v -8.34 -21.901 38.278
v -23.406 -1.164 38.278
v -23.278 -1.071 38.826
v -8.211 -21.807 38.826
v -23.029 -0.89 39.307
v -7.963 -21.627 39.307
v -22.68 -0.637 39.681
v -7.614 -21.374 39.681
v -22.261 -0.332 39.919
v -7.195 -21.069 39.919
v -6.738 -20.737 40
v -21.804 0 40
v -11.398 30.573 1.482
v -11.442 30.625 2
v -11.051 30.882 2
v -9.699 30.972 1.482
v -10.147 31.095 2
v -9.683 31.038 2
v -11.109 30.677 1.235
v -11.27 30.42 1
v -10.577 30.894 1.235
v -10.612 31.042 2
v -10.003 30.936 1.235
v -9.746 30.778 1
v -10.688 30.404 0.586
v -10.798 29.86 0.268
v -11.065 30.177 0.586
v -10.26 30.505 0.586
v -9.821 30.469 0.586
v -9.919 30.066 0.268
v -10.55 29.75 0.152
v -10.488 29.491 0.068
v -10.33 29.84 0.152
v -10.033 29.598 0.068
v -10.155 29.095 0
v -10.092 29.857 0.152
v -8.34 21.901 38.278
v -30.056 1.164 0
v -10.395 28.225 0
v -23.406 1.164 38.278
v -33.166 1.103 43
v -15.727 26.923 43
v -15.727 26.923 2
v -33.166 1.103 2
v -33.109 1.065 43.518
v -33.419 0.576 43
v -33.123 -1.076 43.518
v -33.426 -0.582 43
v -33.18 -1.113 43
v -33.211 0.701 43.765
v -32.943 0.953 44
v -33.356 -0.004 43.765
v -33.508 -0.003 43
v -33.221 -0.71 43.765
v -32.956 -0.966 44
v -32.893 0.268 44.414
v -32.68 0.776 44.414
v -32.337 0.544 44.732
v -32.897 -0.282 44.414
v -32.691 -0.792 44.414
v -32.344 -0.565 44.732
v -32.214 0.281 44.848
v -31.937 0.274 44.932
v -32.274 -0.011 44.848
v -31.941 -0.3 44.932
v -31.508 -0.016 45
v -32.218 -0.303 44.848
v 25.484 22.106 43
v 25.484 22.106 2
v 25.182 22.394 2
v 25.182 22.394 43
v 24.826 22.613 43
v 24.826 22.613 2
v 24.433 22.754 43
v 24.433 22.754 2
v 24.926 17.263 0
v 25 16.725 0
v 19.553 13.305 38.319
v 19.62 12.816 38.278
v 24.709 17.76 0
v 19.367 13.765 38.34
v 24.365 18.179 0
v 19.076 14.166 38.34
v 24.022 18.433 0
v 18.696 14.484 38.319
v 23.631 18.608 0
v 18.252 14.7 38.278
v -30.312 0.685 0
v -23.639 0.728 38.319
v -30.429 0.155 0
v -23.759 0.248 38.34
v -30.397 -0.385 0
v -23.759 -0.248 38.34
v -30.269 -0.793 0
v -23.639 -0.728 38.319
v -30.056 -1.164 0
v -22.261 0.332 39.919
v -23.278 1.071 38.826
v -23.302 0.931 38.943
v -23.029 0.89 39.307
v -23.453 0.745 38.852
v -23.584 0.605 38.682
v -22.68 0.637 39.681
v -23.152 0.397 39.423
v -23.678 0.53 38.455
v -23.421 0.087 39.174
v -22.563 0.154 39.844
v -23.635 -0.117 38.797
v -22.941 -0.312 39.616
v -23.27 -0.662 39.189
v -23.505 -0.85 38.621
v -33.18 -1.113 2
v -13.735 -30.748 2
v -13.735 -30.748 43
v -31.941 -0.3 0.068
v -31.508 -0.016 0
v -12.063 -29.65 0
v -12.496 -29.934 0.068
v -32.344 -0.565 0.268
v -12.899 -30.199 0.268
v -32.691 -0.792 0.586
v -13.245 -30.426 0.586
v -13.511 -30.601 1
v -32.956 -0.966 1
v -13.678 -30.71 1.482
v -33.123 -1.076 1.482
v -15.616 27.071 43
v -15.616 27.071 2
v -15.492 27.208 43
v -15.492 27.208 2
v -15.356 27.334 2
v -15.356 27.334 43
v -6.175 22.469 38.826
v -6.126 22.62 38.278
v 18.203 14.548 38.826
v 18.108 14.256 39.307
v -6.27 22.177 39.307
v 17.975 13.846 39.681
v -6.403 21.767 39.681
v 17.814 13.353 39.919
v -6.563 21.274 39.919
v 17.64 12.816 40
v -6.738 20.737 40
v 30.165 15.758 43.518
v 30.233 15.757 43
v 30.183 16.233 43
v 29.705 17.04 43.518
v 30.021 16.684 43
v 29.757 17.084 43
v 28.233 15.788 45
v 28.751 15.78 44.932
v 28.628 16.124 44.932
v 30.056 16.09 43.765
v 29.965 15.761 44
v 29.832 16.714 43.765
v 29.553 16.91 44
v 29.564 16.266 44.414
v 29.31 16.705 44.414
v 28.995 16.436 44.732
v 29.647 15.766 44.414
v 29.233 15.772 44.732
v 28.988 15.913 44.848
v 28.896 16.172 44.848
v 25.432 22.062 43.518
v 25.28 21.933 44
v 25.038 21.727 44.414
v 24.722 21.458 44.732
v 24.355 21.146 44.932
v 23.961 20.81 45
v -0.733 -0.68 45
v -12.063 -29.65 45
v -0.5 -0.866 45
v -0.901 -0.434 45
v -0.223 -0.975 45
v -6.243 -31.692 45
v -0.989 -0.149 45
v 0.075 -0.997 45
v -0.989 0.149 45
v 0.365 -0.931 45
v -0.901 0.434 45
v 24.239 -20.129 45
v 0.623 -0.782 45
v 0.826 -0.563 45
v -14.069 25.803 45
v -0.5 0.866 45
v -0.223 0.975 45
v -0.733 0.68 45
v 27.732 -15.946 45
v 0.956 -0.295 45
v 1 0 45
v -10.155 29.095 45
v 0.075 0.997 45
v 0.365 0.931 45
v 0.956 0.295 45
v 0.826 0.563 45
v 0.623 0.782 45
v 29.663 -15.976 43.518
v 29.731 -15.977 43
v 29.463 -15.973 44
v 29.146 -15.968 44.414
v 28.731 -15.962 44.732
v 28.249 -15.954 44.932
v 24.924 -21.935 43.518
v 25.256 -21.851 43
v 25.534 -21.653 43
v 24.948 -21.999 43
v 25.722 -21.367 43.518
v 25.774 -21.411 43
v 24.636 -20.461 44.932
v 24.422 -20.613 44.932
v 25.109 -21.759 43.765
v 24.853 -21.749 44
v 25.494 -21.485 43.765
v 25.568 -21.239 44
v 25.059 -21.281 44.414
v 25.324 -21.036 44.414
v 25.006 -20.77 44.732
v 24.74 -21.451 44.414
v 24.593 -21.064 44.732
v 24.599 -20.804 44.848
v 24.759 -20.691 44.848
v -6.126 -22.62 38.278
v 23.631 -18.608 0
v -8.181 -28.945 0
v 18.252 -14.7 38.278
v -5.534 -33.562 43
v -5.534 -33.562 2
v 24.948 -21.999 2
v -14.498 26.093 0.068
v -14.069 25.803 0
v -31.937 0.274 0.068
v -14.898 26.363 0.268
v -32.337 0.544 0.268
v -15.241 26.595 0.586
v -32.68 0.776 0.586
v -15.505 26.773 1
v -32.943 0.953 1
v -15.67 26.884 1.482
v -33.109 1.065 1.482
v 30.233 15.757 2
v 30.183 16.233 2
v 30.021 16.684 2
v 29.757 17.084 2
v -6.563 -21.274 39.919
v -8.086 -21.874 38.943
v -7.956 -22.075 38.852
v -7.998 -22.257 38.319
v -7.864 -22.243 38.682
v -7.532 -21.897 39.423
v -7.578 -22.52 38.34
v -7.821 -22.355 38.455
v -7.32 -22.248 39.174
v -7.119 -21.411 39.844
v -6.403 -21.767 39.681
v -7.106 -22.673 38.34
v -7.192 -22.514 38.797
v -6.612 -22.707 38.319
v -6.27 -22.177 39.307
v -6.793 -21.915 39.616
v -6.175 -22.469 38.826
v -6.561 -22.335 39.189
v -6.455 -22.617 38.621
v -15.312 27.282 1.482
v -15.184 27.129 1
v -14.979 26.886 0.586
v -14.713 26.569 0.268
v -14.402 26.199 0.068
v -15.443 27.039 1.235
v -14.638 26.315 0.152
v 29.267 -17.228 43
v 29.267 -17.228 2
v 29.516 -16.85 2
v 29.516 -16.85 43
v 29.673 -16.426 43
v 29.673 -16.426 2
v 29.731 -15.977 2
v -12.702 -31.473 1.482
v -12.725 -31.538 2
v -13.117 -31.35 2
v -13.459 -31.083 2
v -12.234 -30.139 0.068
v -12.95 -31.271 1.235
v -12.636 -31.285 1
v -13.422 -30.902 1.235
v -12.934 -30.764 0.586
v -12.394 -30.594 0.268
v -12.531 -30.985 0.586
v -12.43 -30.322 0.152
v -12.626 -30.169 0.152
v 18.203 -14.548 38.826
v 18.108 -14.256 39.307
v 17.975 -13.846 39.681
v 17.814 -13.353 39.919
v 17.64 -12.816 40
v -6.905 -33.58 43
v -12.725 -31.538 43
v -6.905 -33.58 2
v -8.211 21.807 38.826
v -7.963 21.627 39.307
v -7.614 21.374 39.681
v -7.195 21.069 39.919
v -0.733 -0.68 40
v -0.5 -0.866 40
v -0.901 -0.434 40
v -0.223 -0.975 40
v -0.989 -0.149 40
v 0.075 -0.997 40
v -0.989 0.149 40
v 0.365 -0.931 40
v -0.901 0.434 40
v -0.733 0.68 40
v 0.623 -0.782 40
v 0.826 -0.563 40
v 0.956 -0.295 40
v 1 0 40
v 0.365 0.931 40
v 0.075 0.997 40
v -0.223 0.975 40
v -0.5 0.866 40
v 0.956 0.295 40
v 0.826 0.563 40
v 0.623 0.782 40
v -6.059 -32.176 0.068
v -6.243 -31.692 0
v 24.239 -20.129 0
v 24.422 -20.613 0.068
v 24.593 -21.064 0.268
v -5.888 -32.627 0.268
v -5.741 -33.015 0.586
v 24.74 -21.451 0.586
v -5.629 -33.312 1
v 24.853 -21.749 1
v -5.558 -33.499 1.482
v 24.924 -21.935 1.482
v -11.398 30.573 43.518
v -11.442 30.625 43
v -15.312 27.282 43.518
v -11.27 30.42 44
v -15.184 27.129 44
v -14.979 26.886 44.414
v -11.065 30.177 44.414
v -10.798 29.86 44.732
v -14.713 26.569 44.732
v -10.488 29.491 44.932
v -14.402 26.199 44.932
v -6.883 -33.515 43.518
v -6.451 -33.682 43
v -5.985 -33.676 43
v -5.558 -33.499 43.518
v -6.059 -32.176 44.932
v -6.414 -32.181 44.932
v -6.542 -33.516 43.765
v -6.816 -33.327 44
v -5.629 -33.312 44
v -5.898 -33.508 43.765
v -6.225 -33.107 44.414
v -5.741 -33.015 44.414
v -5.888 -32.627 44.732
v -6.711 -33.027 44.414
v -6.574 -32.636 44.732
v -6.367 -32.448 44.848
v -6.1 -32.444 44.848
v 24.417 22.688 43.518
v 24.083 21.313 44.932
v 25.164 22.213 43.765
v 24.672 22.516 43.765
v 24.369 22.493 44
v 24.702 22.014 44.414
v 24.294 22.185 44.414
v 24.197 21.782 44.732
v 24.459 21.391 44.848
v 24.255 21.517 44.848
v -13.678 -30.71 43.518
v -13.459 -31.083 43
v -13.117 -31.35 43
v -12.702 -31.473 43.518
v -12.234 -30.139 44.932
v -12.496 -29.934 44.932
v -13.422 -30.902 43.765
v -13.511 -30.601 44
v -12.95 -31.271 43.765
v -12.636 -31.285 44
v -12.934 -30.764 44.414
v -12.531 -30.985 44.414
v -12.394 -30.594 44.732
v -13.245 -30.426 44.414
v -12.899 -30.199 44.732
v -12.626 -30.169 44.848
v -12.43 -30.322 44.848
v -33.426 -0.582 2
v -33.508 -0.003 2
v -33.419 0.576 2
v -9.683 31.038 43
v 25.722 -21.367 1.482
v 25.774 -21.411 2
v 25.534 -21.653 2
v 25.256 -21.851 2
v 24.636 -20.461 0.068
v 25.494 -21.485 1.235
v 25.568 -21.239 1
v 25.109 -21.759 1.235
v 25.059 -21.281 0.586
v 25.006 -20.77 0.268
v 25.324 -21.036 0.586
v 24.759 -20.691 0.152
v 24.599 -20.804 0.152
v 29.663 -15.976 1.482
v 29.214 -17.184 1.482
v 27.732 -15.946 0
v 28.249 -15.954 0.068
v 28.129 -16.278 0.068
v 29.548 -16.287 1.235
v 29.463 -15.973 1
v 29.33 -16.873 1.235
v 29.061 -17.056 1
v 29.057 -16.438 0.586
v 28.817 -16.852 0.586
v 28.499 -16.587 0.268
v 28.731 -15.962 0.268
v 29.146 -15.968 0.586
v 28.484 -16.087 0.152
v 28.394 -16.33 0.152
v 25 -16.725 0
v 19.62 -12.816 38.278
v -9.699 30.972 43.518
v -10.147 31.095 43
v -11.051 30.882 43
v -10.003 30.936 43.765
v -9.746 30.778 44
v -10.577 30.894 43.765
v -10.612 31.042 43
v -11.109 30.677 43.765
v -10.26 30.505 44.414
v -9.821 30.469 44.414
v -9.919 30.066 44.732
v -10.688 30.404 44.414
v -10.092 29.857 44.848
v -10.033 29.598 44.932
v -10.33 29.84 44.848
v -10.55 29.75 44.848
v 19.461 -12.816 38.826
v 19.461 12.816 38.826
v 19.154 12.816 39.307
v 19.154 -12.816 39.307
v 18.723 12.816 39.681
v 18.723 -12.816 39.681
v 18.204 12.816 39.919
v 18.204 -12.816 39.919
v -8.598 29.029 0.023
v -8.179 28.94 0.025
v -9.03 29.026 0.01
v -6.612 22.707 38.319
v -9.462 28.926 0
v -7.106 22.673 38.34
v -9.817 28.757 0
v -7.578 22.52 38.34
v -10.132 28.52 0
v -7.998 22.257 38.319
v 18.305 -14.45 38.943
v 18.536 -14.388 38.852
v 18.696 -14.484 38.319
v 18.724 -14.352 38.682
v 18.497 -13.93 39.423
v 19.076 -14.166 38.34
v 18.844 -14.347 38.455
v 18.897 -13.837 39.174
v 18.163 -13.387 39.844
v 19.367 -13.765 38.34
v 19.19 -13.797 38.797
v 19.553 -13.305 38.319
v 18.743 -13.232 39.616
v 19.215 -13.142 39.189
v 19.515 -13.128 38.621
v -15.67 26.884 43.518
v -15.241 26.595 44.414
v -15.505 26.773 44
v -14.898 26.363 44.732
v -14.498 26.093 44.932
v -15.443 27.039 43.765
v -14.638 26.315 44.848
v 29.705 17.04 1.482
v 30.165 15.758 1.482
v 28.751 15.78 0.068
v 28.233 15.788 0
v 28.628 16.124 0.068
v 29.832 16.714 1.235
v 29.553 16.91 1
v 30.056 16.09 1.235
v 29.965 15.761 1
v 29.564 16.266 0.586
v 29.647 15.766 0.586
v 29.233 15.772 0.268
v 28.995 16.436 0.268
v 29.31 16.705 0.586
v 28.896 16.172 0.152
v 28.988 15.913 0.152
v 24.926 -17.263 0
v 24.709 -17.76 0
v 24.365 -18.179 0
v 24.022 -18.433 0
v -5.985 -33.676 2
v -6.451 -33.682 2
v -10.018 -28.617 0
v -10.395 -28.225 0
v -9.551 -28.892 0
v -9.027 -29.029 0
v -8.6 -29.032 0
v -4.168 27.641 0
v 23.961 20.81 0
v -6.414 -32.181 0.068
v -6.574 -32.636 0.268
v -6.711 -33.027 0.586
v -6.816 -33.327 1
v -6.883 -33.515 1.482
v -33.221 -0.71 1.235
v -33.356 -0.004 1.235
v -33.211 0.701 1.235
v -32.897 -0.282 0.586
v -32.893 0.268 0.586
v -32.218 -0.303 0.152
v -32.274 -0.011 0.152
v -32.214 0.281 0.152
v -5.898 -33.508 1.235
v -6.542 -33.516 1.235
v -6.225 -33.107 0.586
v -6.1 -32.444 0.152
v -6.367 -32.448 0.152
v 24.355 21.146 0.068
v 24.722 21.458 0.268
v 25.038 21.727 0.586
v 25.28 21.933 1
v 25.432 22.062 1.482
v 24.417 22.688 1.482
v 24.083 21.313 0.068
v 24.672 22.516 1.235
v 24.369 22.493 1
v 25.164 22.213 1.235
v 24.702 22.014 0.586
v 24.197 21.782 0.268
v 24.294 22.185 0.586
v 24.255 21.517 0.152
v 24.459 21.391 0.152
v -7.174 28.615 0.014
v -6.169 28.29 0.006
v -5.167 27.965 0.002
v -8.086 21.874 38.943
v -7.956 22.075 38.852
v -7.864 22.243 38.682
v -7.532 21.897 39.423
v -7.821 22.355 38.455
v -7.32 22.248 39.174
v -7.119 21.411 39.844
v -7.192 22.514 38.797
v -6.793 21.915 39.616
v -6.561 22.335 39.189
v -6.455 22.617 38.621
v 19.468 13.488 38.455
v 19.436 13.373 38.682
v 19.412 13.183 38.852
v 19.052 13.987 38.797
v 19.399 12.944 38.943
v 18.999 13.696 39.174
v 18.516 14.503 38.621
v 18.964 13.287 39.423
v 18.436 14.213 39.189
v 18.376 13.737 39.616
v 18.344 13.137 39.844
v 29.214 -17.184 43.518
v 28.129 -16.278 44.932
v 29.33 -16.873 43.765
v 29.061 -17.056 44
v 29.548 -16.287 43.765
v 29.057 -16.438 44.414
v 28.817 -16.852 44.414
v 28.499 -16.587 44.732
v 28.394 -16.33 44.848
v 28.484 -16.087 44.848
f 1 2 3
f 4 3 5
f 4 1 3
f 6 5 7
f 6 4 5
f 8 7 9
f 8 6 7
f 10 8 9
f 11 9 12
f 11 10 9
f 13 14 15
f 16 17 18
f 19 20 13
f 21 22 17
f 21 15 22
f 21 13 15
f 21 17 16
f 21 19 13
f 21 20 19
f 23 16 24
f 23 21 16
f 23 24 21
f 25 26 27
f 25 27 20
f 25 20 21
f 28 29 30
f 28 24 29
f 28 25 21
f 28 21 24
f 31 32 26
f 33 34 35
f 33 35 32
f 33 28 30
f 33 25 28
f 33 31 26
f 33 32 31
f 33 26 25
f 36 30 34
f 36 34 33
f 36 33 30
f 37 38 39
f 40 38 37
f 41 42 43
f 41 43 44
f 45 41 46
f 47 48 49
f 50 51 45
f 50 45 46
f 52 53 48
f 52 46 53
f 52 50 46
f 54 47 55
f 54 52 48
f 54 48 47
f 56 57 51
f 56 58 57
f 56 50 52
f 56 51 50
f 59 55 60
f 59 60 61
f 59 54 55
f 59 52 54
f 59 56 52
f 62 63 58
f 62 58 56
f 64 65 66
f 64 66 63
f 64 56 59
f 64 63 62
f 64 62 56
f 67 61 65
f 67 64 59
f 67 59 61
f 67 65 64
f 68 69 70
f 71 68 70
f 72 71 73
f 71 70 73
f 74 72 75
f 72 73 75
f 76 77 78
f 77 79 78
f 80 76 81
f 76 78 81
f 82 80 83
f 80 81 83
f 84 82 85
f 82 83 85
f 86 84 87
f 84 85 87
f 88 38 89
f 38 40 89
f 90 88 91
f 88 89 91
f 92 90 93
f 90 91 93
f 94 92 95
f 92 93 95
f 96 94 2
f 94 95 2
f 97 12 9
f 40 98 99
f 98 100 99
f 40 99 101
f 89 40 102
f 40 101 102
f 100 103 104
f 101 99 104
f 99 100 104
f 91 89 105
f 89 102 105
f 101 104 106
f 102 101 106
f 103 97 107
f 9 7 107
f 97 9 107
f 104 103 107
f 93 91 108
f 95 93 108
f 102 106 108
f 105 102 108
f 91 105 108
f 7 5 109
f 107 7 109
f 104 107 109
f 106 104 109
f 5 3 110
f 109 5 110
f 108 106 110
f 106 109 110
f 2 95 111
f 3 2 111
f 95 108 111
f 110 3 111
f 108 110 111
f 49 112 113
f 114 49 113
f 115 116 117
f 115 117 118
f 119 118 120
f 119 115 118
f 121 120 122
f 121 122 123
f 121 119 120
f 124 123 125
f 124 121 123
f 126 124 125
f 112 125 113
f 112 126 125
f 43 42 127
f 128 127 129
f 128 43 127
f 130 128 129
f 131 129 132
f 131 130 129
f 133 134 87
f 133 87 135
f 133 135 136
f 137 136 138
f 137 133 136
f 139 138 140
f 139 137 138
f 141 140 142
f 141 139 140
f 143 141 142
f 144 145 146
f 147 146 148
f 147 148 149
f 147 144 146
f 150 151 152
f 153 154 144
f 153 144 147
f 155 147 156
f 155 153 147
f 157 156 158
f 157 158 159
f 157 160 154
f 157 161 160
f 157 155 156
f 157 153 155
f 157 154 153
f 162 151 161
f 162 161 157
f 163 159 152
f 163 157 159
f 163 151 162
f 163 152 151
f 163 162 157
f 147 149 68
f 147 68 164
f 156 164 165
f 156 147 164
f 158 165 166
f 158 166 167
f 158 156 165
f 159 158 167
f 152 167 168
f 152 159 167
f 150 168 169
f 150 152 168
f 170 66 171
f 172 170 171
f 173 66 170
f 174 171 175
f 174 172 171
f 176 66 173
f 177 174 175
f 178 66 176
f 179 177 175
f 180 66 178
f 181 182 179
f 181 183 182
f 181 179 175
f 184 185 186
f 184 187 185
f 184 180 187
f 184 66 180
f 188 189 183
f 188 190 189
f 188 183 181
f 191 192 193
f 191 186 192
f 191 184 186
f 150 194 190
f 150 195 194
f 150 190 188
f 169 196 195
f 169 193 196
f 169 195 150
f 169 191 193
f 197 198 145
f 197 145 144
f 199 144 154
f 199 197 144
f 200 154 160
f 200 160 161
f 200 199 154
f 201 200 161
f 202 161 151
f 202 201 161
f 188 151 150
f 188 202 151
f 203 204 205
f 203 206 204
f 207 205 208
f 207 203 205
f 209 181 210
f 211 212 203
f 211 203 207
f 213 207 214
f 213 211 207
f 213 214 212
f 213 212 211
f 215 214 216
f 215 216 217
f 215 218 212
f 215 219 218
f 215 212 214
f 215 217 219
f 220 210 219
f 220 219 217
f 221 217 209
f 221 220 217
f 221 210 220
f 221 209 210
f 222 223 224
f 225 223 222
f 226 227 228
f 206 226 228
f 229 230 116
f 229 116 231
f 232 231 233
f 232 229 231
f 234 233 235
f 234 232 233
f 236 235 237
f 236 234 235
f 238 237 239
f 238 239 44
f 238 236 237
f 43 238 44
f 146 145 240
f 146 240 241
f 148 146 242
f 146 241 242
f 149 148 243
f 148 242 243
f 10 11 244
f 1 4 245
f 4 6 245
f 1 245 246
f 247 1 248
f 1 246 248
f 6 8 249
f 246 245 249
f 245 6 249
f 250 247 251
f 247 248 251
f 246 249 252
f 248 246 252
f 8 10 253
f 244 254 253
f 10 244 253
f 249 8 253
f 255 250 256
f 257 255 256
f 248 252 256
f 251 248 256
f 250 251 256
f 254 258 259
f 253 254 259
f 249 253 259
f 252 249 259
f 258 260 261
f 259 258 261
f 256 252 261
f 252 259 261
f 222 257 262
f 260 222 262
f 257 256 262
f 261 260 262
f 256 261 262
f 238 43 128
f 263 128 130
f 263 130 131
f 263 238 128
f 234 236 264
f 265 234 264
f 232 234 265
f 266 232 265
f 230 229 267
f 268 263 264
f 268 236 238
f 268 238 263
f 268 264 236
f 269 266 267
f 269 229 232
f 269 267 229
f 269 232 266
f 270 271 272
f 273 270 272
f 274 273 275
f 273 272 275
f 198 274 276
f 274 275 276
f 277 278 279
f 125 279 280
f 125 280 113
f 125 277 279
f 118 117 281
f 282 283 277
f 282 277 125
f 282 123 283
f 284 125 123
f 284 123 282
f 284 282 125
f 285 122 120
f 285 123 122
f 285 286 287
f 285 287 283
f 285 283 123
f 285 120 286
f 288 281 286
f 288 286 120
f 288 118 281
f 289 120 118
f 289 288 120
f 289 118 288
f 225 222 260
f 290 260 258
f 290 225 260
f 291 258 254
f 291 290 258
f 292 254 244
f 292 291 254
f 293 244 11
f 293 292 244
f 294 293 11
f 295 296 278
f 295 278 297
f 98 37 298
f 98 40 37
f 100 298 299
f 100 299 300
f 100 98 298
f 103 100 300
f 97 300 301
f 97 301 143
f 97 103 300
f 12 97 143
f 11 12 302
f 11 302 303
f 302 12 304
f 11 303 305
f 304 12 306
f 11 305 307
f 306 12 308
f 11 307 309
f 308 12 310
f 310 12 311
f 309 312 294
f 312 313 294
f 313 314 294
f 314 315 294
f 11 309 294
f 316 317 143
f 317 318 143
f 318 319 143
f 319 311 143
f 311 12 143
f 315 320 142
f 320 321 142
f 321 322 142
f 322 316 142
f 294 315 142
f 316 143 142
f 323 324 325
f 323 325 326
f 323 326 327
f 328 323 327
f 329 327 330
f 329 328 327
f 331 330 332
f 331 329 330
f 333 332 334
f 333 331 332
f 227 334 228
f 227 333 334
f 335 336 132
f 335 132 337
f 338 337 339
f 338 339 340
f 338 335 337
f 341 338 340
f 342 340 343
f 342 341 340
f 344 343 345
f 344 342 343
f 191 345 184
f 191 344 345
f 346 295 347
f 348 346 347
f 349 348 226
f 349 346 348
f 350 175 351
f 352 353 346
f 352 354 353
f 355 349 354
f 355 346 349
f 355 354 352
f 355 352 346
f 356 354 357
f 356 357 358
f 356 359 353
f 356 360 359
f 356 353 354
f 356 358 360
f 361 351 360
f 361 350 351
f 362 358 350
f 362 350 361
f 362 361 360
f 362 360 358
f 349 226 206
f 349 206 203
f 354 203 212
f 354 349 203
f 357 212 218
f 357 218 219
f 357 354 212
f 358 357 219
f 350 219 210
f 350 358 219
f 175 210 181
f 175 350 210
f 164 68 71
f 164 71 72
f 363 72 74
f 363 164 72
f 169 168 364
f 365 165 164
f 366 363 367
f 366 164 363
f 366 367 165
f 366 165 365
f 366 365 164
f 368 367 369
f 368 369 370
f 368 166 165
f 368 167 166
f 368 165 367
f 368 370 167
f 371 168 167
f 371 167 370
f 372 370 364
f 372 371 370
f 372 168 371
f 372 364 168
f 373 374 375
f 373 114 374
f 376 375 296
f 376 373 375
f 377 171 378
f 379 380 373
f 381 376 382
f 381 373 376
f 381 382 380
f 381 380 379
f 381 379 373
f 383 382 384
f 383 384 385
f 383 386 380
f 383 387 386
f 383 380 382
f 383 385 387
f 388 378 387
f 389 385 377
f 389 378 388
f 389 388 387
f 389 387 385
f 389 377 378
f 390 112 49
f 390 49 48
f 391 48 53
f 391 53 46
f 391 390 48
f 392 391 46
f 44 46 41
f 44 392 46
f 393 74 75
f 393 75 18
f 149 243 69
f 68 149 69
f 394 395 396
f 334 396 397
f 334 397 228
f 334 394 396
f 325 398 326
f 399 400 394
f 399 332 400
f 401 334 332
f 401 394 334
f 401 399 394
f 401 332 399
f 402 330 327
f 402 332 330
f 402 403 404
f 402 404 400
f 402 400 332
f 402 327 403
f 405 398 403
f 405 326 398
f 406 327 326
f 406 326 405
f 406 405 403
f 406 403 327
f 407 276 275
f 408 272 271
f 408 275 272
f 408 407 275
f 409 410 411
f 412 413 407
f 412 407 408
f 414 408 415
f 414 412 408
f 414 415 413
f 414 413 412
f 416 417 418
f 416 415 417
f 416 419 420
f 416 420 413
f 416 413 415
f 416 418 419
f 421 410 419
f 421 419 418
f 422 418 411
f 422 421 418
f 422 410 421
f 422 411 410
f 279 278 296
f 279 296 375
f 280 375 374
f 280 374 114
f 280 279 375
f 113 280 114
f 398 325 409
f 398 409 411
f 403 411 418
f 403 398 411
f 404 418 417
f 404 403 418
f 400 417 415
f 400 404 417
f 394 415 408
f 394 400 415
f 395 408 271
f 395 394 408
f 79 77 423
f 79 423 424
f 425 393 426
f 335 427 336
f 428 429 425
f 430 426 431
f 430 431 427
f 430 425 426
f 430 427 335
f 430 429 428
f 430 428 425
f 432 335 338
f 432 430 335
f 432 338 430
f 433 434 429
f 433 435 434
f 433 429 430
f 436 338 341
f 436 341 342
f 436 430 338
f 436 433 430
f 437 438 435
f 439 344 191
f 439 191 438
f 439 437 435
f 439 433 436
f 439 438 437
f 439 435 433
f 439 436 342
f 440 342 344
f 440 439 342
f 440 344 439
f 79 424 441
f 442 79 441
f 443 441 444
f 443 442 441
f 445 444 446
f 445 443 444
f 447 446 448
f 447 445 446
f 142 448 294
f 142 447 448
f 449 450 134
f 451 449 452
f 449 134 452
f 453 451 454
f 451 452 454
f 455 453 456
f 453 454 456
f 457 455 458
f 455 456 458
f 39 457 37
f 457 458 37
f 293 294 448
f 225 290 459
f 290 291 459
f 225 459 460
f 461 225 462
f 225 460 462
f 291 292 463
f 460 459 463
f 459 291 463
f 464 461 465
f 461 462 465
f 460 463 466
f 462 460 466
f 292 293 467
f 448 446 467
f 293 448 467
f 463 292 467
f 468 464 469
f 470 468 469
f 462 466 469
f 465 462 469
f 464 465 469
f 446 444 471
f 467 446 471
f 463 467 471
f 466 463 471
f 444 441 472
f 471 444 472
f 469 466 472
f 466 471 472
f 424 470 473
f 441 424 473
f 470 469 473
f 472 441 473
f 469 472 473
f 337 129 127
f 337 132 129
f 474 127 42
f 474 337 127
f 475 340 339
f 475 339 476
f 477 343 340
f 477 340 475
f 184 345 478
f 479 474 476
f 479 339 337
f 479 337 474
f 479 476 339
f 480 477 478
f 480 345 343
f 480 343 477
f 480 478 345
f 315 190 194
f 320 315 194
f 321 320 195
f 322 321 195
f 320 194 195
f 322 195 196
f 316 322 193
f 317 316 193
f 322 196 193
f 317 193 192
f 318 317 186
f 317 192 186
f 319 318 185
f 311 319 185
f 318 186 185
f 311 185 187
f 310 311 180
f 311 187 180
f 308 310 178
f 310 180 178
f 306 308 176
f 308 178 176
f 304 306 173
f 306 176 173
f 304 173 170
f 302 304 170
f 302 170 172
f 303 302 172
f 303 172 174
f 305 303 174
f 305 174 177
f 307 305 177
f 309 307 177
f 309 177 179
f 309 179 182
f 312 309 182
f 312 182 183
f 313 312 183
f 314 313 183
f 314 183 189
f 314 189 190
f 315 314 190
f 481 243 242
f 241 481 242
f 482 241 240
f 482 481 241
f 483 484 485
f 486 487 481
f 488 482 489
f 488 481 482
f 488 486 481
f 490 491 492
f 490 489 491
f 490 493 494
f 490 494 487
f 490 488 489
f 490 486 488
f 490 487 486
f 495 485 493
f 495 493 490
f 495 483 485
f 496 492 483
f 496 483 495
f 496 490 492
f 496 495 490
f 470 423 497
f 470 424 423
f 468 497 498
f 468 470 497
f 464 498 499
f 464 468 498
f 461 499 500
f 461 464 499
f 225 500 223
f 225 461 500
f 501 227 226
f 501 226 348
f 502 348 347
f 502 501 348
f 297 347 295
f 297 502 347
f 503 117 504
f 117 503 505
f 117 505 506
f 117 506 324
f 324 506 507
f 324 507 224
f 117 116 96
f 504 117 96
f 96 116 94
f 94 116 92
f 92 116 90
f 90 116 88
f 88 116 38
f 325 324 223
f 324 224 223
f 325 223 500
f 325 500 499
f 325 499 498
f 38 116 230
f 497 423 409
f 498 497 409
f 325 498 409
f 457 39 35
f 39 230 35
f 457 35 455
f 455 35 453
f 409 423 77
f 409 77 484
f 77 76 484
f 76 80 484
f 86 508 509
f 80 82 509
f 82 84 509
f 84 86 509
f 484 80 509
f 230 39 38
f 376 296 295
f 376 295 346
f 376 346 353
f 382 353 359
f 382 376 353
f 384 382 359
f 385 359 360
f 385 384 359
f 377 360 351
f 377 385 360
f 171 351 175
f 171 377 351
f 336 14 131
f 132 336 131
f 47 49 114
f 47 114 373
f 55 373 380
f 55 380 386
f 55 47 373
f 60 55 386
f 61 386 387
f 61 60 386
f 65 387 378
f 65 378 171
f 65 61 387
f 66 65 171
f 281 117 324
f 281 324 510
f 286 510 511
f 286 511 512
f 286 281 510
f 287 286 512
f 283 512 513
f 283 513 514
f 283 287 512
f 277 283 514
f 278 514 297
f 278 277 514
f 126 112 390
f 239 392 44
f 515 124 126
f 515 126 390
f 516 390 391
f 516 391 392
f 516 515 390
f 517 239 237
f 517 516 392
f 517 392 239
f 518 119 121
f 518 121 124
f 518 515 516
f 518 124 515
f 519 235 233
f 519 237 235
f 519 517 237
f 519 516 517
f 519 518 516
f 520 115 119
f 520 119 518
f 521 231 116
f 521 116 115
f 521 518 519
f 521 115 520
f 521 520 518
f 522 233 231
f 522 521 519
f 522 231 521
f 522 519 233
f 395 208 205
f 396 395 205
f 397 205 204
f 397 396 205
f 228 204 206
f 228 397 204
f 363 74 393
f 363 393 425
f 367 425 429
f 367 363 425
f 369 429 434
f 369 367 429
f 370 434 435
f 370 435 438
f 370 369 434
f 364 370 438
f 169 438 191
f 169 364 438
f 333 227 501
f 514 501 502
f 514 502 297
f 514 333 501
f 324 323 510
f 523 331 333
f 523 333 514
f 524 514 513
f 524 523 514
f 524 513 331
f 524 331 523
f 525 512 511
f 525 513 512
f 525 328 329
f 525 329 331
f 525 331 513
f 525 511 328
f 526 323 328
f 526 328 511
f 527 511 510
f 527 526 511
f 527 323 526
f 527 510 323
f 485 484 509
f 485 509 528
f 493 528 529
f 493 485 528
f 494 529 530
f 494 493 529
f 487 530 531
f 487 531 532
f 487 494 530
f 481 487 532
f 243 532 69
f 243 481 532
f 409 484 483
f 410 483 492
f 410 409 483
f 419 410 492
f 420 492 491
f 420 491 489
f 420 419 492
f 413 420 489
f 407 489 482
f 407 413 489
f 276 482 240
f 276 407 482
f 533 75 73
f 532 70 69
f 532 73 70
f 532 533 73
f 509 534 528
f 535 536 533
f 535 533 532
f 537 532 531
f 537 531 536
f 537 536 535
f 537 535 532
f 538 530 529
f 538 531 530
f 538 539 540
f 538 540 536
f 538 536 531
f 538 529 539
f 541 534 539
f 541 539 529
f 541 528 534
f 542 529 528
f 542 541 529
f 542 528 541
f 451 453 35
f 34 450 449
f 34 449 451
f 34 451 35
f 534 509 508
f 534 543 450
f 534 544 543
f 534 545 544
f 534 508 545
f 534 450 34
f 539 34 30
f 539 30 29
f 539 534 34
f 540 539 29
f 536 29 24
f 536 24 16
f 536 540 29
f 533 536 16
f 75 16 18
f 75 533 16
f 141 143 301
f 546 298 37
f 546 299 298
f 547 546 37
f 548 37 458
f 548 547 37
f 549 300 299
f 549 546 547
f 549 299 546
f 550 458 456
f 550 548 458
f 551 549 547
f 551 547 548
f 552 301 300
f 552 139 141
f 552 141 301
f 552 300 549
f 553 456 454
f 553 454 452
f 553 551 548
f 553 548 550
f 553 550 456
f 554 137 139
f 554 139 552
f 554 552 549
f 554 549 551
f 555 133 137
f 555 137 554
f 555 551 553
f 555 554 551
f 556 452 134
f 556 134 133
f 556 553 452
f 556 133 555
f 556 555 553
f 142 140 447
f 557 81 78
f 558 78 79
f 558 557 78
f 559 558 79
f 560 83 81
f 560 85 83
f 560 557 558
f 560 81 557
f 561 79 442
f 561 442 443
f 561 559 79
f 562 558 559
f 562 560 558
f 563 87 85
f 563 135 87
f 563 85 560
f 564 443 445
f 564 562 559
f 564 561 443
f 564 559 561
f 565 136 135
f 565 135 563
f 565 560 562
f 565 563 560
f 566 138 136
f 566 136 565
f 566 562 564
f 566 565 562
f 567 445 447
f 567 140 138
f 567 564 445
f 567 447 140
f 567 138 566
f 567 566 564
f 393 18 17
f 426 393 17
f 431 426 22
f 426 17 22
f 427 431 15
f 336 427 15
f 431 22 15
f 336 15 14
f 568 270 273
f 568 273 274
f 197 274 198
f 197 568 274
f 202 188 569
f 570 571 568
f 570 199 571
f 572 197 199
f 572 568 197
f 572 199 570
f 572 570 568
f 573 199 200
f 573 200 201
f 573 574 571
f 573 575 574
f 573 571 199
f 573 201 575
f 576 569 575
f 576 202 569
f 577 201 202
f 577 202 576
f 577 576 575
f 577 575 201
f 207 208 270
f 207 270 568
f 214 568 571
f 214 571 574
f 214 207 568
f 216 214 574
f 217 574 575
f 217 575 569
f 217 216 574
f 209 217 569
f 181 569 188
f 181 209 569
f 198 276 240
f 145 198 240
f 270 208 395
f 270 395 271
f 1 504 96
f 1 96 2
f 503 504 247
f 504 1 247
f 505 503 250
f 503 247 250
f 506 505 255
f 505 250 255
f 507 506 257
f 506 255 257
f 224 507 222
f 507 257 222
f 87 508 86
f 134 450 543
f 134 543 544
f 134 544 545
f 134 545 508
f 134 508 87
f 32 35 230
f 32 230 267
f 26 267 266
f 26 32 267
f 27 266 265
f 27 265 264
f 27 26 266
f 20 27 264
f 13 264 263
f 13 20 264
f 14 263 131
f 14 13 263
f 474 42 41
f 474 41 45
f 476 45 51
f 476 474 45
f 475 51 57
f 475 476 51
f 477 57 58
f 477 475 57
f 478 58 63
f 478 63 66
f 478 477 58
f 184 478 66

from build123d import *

# Parameters (mm, degrees)
F1_DEPTH      = 45
F3_DEPTH      = 40
F3_TAPER      = 8
F4_R          = 2
F5_T1_DEPTH   = 41
F5_T3_DEPTH   = 35.1069251356
F5_T5_DEPTH   = 6.5937371539
F5_T7_DEPTH   = 31.737863034
F5_T9_DEPTH   = 5.4498579355
F5_T11_DEPTH  = 32.6011890019
F5_T13_DEPTH  = 6.1677770557
F5_T15_DEPTH  = 35.4445627494
F5_T17_DEPTH  = 31.1568553356
F5_T19_DEPTH  = 5.1143087809
F5_T24_DEPTH  = 2
F5_T30_DEPTH  = 2
F5_T36_DEPTH  = 2
F5_T42_DEPTH  = 2
F5_T48_DEPTH  = 2
F5_T54_DEPTH  = 2
F5_T60_DEPTH  = 2
F5_T66_DEPTH  = 2
F5_T72_DEPTH  = 2
F5_T78_DEPTH  = 2
F5_T84_DEPTH  = 2
F5_T90_DEPTH  = 2
F5_T96_DEPTH  = 2
F5_T102_DEPTH = 2
F5_T108_DEPTH = 2
F5_T114_DEPTH = 2
F5_T120_DEPTH = 2
F5_T126_DEPTH = 2
F6_R          = 1
F7_DEPTH      = 45.0010001


# Not quite as in the source:
# - a fillet or chamfer that OpenCascade refuses, or shapes differently, is made with other operations: its cross-section is extruded or revolved along the edge and cut away or added


with BuildPart() as f1:
    # F0 (on Top) → F1 (new body)
    with BuildSketch(Plane.XY):
        Polygon((29.7201480716, -16.6846308857), (30.2449911833, 16.5100768209), (25.0633712858, 22.6006042212), (-10.6668910012, 31.2771238387), (-15.5701944605, 27.1541606635), (-33.9107997715, 0), (-13.3636286482, -31.3134789467), (-6.2161423266, -33.8213965297), (25.438066572, -21.8132548034), align=None)
    extrude(amount=F1_DEPTH)

    # F2 (on Top) → F3 (cut)
    with BuildSketch(Plane.XY):
        Polygon((25, -18.1635632001), (25, 18.1635632001), (-9.5491502813, 29.3892626146), (-30.9016994375, 0), (-9.5491502813, -29.3892626146), align=None)
    extrude(amount=F3_DEPTH, taper=F3_TAPER, mode=Mode.SUBTRACT)

    # F4
    f4_edges = [f1.edges().sort_by_distance(p)[0] for p in [
        (5.988245, 18.429922, 40),
        (22.189183, 16.121385, 20),
        (19.378367, 0, 40),
        (5.988245, -18.429922, 40),
        (-15.677428, -11.390318, 40),
        (-15.677428, 11.390318, 40),
        (-8.475514, 26.084949, 20.000003),
        (-27.427338, 0, 20.000003),
        (-8.475514, -26.084949, 20),
        (22.189183, -16.121385, 20.000003),
    ]]
    fillet(f4_edges, radius=F4_R)

    # F5: fillet of radius 2 on 27 edges, made by hand

    # F5_s2 → F5_t1 (cut)
    with BuildSketch(Plane.XY.offset(2)):
        with BuildLine():
            ThreePointArc((25.4839689775, 22.1062295244), (25.0095176152, 22.5131674422), (24.4326191036, 22.7537722455))
            Line((24.4326191036, 22.7537722455), (25.0633712858, 22.6006042212))
            Line((25.0633712858, 22.6006042212), (25.4839689775, 22.1062295244))
        make_face()
        with BuildLine():
            ThreePointArc((-9.6828471205, 31.0381646067), (-10.6116670526, 31.0417656744), (-11.4419497811, 30.6254124292))
            Line((-11.4419497811, 30.6254124292), (-10.6668910012, 31.2771238387))
            Line((-10.6668910012, 31.2771238387), (-9.6828471205, 31.0381646067))
        make_face()
        with BuildLine():
            ThreePointArc((30.2330765046, 15.75651015), (30.115771586, 16.4637023449), (29.7566283548, 17.0841033313))
            Line((29.7566283548, 17.0841033313), (30.2449911833, 16.5100768209))
            Line((30.2449911833, 16.5100768209), (30.2330765046, 15.75651015))
        make_face()
        with BuildLine():
            ThreePointArc((29.266810806, -17.2275902721), (29.606353406, -16.6423498995), (29.7313303454, -15.9773865656))
            Line((29.7313303454, -15.9773865656), (29.7201480716, -16.6846308857))
            Line((29.7201480716, -16.6846308857), (29.266810806, -17.2275902721))
        make_face()
        with BuildLine():
            ThreePointArc((25.7739373145, -21.4109843833), (25.3988996269, -21.7582581704), (24.9480861633, -21.9991306915))
            Line((24.9480861633, -21.9991306915), (25.438066572, -21.8132548034))
            Line((25.438066572, -21.8132548034), (25.7739373145, -21.4109843833))
        make_face()
        with BuildLine():
            ThreePointArc((-5.5335065177, -33.5624360999), (-6.217763907, -33.6923101567), (-6.90506781, -33.5796656252))
            Line((-6.90506781, -33.5796656252), (-6.2161423266, -33.8213965297))
            Line((-6.2161423266, -33.8213965297), (-5.5335065177, -33.5624360999))
        make_face()
        with BuildLine():
            ThreePointArc((-12.7249750969, -31.5375703823), (-13.294983208, -31.2257163798), (-13.7349453155, -30.7475997522))
            Line((-13.7349453155, -30.7475997522), (-13.3636286482, -31.3134789467))
            Line((-13.3636286482, -31.3134789467), (-12.7249750969, -31.5375703823))
        make_face()
        with BuildLine():
            ThreePointArc((-33.1803118935, -1.1132489554), (-33.5081152827, -0.0026852842), (-33.1655302123, 1.1034079304))
            Line((-33.1655302123, 1.1034079304), (-33.9107997715, 0))
            Line((-33.9107997715, 0), (-33.1803118935, -1.1132489554))
        make_face()
        with BuildLine():
            ThreePointArc((-15.7265735436, 26.922633804), (-15.5557596342, 27.1411687), (-15.3563537075, 27.3339695529))
            Line((-15.3563537075, 27.3339695529), (-15.5701944605, 27.1541606635))
            Line((-15.5701944605, 27.1541606635), (-15.7265735436, 26.922633804))
        make_face()
    extrude(amount=F5_T1_DEPTH, mode=Mode.SUBTRACT)

    # F5_s4 → F5_t3 (cut)
    with BuildSketch(Plane(origin=(17.8543882754, -4.335651076, 0), x_dir=(0, 0, 1), z_dir=(-0.9717588793, 0.235976017, 0))):
        with BuildLine():
            ThreePointArc((0, 25.8766923562), (0.5857864376, 27.2909059185), (2, 27.8766923562))
            Line((2, 27.8766923562), (0, 27.8766923562))
            Line((0, 27.8766923562), (0, 25.8766923562))
        make_face()
        with BuildLine():
            ThreePointArc((43, 27.8766923562), (44.4142135624, 27.2909059185), (45, 25.8766923562))
            Line((45, 25.8766923562), (45, 27.8766923562))
            Line((45, 27.8766923562), (43, 27.8766923562))
        make_face()
    extrude(amount=F5_T3_DEPTH, mode=Mode.SUBTRACT)

    # F5_s6 → F5_t5 (cut)
    with BuildSketch(Plane(origin=(4.0627522572, -4.775399283, 0), x_dir=(0, 0, 1), z_dir=(-0.6479875187, 0.7616509539, 0))):
        with BuildLine():
            ThreePointArc((0, 31.7344500987), (0.5857864376, 33.1486636611), (2, 33.7344500987))
            Line((2, 33.7344500987), (0, 33.7344500987))
            Line((0, 33.7344500987), (0, 31.7344500987))
        make_face()
        with BuildLine():
            ThreePointArc((43, 33.7344500987), (44.4142135624, 33.1486636611), (45, 31.7344500987))
            Line((45, 31.7344500987), (45, 33.7344500987))
            Line((45, 33.7344500987), (43, 33.7344500987))
        make_face()
    extrude(amount=F5_T5_DEPTH, mode=Mode.SUBTRACT)

    # F5_s8 → F5_t7 (cut)
    with BuildSketch(Plane(origin=(-0.2451254322, -15.5034273892, 0), x_dir=(0, 0, 1), z_dir=(0.0158090719, 0.9998750288, 0))):
        with BuildLine():
            ThreePointArc((0, 27.9802024391), (0.5857864376, 29.3944160014), (2, 29.9802024391))
            Line((2, 29.9802024391), (0, 29.9802024391))
            Line((0, 29.9802024391), (0, 27.9802024391))
        make_face()
        with BuildLine():
            ThreePointArc((43, 29.9802024391), (44.4142135624, 29.3944160014), (45, 27.9802024391))
            Line((45, 27.9802024391), (45, 29.9802024391))
            Line((45, 29.9802024391), (43, 29.9802024391))
        make_face()
    extrude(amount=F5_T7_DEPTH, mode=Mode.SUBTRACT)

    # F5_s10 → F5_t9 (cut)
    with BuildSketch(Plane(origin=(0.0534517688, 0.0640188702, 0), x_dir=(0, 0, 1), z_dir=(0.6409109252, 0.7676152591, 0))):
        with BuildLine():
            ThreePointArc((0, 31.5070013796), (0.5857864376, 32.9212149419), (2, 33.5070013796))
            Line((2, 33.5070013796), (0, 33.5070013796))
            Line((0, 33.5070013796), (0, 31.5070013796))
        make_face()
        with BuildLine():
            ThreePointArc((43, 33.5070013796), (44.4142135624, 32.9212149419), (45, 31.5070013796))
            Line((45, 31.5070013796), (45, 33.5070013796))
            Line((45, 33.5070013796), (43, 33.5070013796))
        make_face()
    extrude(amount=F5_T9_DEPTH, mode=Mode.SUBTRACT)

    # F5_s12 → F5_t11 (cut)
    with BuildSketch(Plane(origin=(-15.9676490674, -6.0573869861, 0), x_dir=(0, 0, 1), z_dir=(0.9349840792, 0.3546896835, 0))):
        with BuildLine():
            ThreePointArc((0, 27.4176657385), (0.5857864376, 28.8318793009), (2, 29.4176657385))
            Line((2, 29.4176657385), (0, 29.4176657385))
            Line((0, 29.4176657385), (0, 27.4176657385))
        make_face()
        with BuildLine():
            ThreePointArc((43, 29.4176657385), (44.4142135624, 28.8318793009), (45, 27.4176657385))
            Line((45, 27.4176657385), (45, 29.4176657385))
            Line((45, 29.4176657385), (43, 29.4176657385))
        make_face()
    extrude(amount=F5_T11_DEPTH, mode=Mode.SUBTRACT)

    # F5_s14 → F5_t13 (cut)
    with BuildSketch(Plane(origin=(-1.477173062, 0.5183120511, 0), x_dir=(0, 0, 1), z_dir=(0.9435988419, -0.3310909627, 0))):
        with BuildLine():
            ThreePointArc((0, 31.9719391439), (0.5857864376, 33.3861527063), (2, 33.9719391439))
            Line((2, 33.9719391439), (0, 33.9719391439))
            Line((0, 33.9719391439), (0, 31.9719391439))
        make_face()
        with BuildLine():
            ThreePointArc((43, 33.9719391439), (44.4142135624, 33.3861527063), (45, 31.9719391439))
            Line((45, 31.9719391439), (45, 33.9719391439))
            Line((45, 33.9719391439), (43, 33.9719391439))
        make_face()
    extrude(amount=F5_T13_DEPTH, mode=Mode.SUBTRACT)

    # F5_s16 → F5_t15 (cut)
    with BuildSketch(Plane(origin=(-9.4758761855, 14.4410462956, 0), x_dir=(0, 0, 1), z_dir=(0.5486135269, -0.836076072, 0))):
        with BuildLine():
            ThreePointArc((0, 26.3520082709), (0.5857864376, 27.7662218332), (2, 28.3520082709))
            Line((2, 28.3520082709), (0, 28.3520082709))
            Line((0, 28.3520082709), (0, 26.3520082709))
        make_face()
        with BuildLine():
            ThreePointArc((43, 28.3520082709), (44.4142135624, 27.7662218332), (45, 26.3520082709))
            Line((45, 26.3520082709), (45, 28.3520082709))
            Line((45, 28.3520082709), (43, 28.3520082709))
        make_face()
    extrude(amount=F5_T15_DEPTH, mode=Mode.SUBTRACT)

    # F5_s18 → F5_t17 (cut)
    with BuildSketch(Plane(origin=(7.5606241791, 11.1938728407, 0), x_dir=(0, 0, 1), z_dir=(-0.5597149161, -0.8286852314, 0))):
        with BuildLine():
            ThreePointArc((0, 26.1013789558), (0.5857864376, 27.5155925181), (2, 28.1013789558))
            Line((2, 28.1013789558), (0, 28.1013789558))
            Line((0, 28.1013789558), (0, 26.1013789558))
        make_face()
        with BuildLine():
            ThreePointArc((43, 28.1013789558), (44.4142135624, 27.5155925181), (45, 26.1013789558))
            Line((45, 26.1013789558), (45, 28.1013789558))
            Line((45, 28.1013789558), (43, 28.1013789558))
        make_face()
    extrude(amount=F5_T17_DEPTH, mode=Mode.SUBTRACT)

    # F5_s20 → F5_t19 (cut)
    with BuildSketch(Plane(origin=(8.3826927124, 7.0486221481, 0), x_dir=(0, 0, 1), z_dir=(-0.7653827905, -0.6435753134, 0))):
        with BuildLine():
            ThreePointArc((0, 28.803920042), (0.5857864376, 30.2181336044), (2, 30.803920042))
            Line((2, 30.803920042), (0, 30.803920042))
            Line((0, 30.803920042), (0, 28.803920042))
        make_face()
        with BuildLine():
            ThreePointArc((43, 30.803920042), (44.4142135624, 30.2181336044), (45, 28.803920042))
            Line((45, 28.803920042), (45, 30.803920042))
            Line((45, 30.803920042), (43, 30.803920042))
        make_face()
    extrude(amount=F5_T19_DEPTH, mode=Mode.SUBTRACT)


with BuildPart() as f5_tool22:
    # F5_s23 → F5_t24 (new body)
    with BuildSketch(Plane.XY.offset(2)):
        Polygon((23.9606670696, 20.810254487), (24.4326191036, 22.7537722455), (25.0633712858, 22.6006042212), (25.4839689775, 22.1062295244), align=None)
    extrude(amount=-F5_T24_DEPTH)

    # F5_s25 → F5_t26 (revolve, cut)
    with BuildSketch(Plane(origin=(23.9606670696, 20.810254487, 2), x_dir=(-0.5244252728, -0.8514564776, 0), z_dir=(0.8514564776, -0.5244252728, 0))):
        with BuildLine():
            ThreePointArc((0, -2), (2, 0), (0, 2))
            Line((0, 2), (0, -2))
        make_face()
    revolve(axis=Axis((23.9606670696, 20.810254487, 2), (0, 0, -1)), mode=Mode.SUBTRACT)


with BuildPart() as f1_1:
    add(f1.part)

    # F5_t21: cut F5_tool22
    add(f5_tool22.part, mode=Mode.SUBTRACT)


with BuildPart() as f5_tool28:
    # F5_s29 → F5_t30 (new body)
    with BuildSketch(Plane.XY.offset(43)):
        Polygon((23.9606670696, 20.810254487), (25.4839689775, 22.1062295244), (25.0633712858, 22.6006042212), (24.4326191036, 22.7537722455), align=None)
    extrude(amount=F5_T30_DEPTH)

    # F5_s31 → F5_t32 (revolve, cut)
    with BuildSketch(Plane(origin=(23.9606670696, 20.810254487, 43), x_dir=(-0.5244252728, -0.8514564776, 0), z_dir=(-0.8514564776, 0.5244252728, 0))):
        with BuildLine():
            ThreePointArc((0, -2), (2, 0), (0, 2))
            Line((0, 2), (0, -2))
        make_face()
    revolve(axis=Axis((23.9606670696, 20.810254487, 43), (0, 0, 1)), mode=Mode.SUBTRACT)


with BuildPart() as f1_2:
    add(f1_1.part)

    # F5_t27: cut F5_tool28
    add(f5_tool28.part, mode=Mode.SUBTRACT)


with BuildPart() as f5_tool34:
    # F5_s35 → F5_t36 (new body)
    with BuildSketch(Plane.XY.offset(2)):
        Polygon((-10.1547991544, 29.0946468482), (-9.6828471205, 31.0381646067), (-10.6668910012, 31.2771238387), (-11.4419497811, 30.6254124292), align=None)
    extrude(amount=-F5_T36_DEPTH)

    # F5_s37 → F5_t38 (revolve, cut)
    with BuildSketch(Plane(origin=(-10.1547991544, 29.0946468482, 2), x_dir=(0.2284339491, -0.9735594131, 0), z_dir=(0.9735594131, 0.2284339491, 0))):
        with BuildLine():
            ThreePointArc((0, -2), (2, 0), (0, 2))
            Line((0, 2), (0, -2))
        make_face()
    revolve(axis=Axis((-10.1547991544, 29.0946468482, 2), (0, 0, -1)), mode=Mode.SUBTRACT)


with BuildPart() as f1_3:
    add(f1_2.part)

    # F5_t33: cut F5_tool34
    add(f5_tool34.part, mode=Mode.SUBTRACT)


with BuildPart() as f5_tool40:
    # F5_s41 → F5_t42 (new body)
    with BuildSketch(Plane.XY.offset(43)):
        Polygon((-10.1547991544, 29.0946468482), (-9.6828471205, 31.0381646067), (-10.6668910012, 31.2771238387), (-11.4419497811, 30.6254124292), align=None)
    extrude(amount=F5_T42_DEPTH)

    # F5_s43 → F5_t44 (revolve, cut)
    with BuildSketch(Plane(origin=(-10.1547991544, 29.0946468482, 43), x_dir=(0.2284339491, -0.9735594131, 0), z_dir=(-0.9735594131, -0.2284339491, 0))):
        with BuildLine():
            ThreePointArc((0, -2), (2, 0), (0, 2))
            Line((0, 2), (0, -2))
        make_face()
    revolve(axis=Axis((-10.1547991544, 29.0946468482, 43), (0, 0, 1)), mode=Mode.SUBTRACT)


with BuildPart() as f1_4:
    add(f1_3.part)

    # F5_t39: cut F5_tool40
    add(f5_tool40.part, mode=Mode.SUBTRACT)


with BuildPart() as f5_tool46:
    # F5_s47 → F5_t48 (new body)
    with BuildSketch(Plane.XY.offset(2)):
        Polygon((28.233326447, 15.7881282939), (30.2330765046, 15.75651015), (30.2449911833, 16.5100768209), (29.7566283548, 17.0841033313), align=None)
    extrude(amount=-F5_T48_DEPTH)

    # F5_s49 → F5_t50 (revolve, cut)
    with BuildSketch(Plane(origin=(28.233326447, 15.7881282939, 2), x_dir=(-0.9412225695, -0.3377870255, 0), z_dir=(0.3377870255, -0.9412225695, 0))):
        with BuildLine():
            ThreePointArc((0, -2), (2, 0), (0, 2))
            Line((0, 2), (0, -2))
        make_face()
    revolve(axis=Axis((28.233326447, 15.7881282939, 2), (0, 0, -1)), mode=Mode.SUBTRACT)


with BuildPart() as f1_5:
    add(f1_4.part)

    # F5_t45: cut F5_tool46
    add(f5_tool46.part, mode=Mode.SUBTRACT)


with BuildPart() as f5_tool52:
    # F5_s53 → F5_t54 (new body)
    with BuildSketch(Plane.XY.offset(43)):
        Polygon((28.233326447, 15.7881282939), (29.7566283548, 17.0841033313), (30.2449911833, 16.5100768209), (30.2330765046, 15.75651015), align=None)
    extrude(amount=F5_T54_DEPTH)

    # F5_s55 → F5_t56 (revolve, cut)
    with BuildSketch(Plane(origin=(28.233326447, 15.7881282939, 43), x_dir=(-0.9412225695, -0.3377870255, 0), z_dir=(-0.3377870255, 0.9412225695, 0))):
        with BuildLine():
            ThreePointArc((0, -2), (2, 0), (0, 2))
            Line((0, 2), (0, -2))
        make_face()
    revolve(axis=Axis((28.233326447, 15.7881282939, 43), (0, 0, 1)), mode=Mode.SUBTRACT)


with BuildPart() as f1_6:
    add(f1_5.part)

    # F5_t51: cut F5_tool52
    add(f5_tool52.part, mode=Mode.SUBTRACT)


with BuildPart() as f5_tool58:
    # F5_s59 → F5_t60 (new body)
    with BuildSketch(Plane.XY.offset(2)):
        Polygon((27.7315802878, -15.9457684217), (29.266810806, -17.2275902721), (29.7201480716, -16.6846308857), (29.7313303454, -15.9773865656), align=None)
    extrude(amount=-F5_T60_DEPTH)

    # F5_s61 → F5_t62 (revolve, cut)
    with BuildSketch(Plane(origin=(27.7315802878, -15.9457684217, 2), x_dir=(-0.9373865591, 0.3482907389, 0), z_dir=(-0.3482907389, -0.9373865591, 0))):
        with BuildLine():
            ThreePointArc((0, -2), (2, 0), (0, 2))
            Line((0, 2), (0, -2))
        make_face()
    revolve(axis=Axis((27.7315802878, -15.9457684217, 2), (0, 0, -1)), mode=Mode.SUBTRACT)


with BuildPart() as f1_7:
    add(f1_6.part)

    # F5_t57: cut F5_tool58
    add(f5_tool58.part, mode=Mode.SUBTRACT)


with BuildPart() as f5_tool64:
    # F5_s65 → F5_t66 (new body)
    with BuildSketch(Plane.XY.offset(43)):
        Polygon((27.7315802878, -15.9457684217), (29.266810806, -17.2275902721), (29.7201480716, -16.6846308857), (29.7313303454, -15.9773865656), align=None)
    extrude(amount=F5_T66_DEPTH)

    # F5_s67 → F5_t68 (revolve, cut)
    with BuildSketch(Plane(origin=(27.7315802878, -15.9457684217, 43), x_dir=(-0.9373865591, 0.3482907389, 0), z_dir=(0.3482907389, 0.9373865591, 0))):
        with BuildLine():
            ThreePointArc((0, -2), (2, 0), (0, 2))
            Line((0, 2), (0, -2))
        make_face()
    revolve(axis=Axis((27.7315802878, -15.9457684217, 43), (0, 0, 1)), mode=Mode.SUBTRACT)


with BuildPart() as f1_8:
    add(f1_7.part)

    # F5_t63: cut F5_tool64
    add(f5_tool64.part, mode=Mode.SUBTRACT)


with BuildPart() as f5_tool70:
    # F5_s71 → F5_t72 (new body)
    with BuildSketch(Plane.XY.offset(2)):
        Polygon((24.2387067963, -20.129162533), (25.7739373145, -21.4109843833), (25.438066572, -21.8132548034), (24.9480861633, -21.9991306915), align=None)
    extrude(amount=-F5_T72_DEPTH)

    # F5_s73 → F5_t74 (revolve, cut)
    with BuildSketch(Plane(origin=(24.2387067963, -20.129162533, 2), x_dir=(-0.5800964153, 0.8145478187, 0), z_dir=(-0.8145478187, -0.5800964153, 0))):
        with BuildLine():
            ThreePointArc((0, -2), (2, 0), (0, 2))
            Line((0, 2), (0, -2))
        make_face()
    revolve(axis=Axis((24.2387067963, -20.129162533, 2), (0, 0, -1)), mode=Mode.SUBTRACT)


with BuildPart() as f1_9:
    add(f1_8.part)

    # F5_t69: cut F5_tool70
    add(f5_tool70.part, mode=Mode.SUBTRACT)


with BuildPart() as f5_tool76:
    # F5_s77 → F5_t78 (new body)
    with BuildSketch(Plane.XY.offset(43)):
        Polygon((24.2387067963, -20.129162533), (25.7739373145, -21.4109843833), (25.438066572, -21.8132548034), (24.9480861633, -21.9991306915), align=None)
    extrude(amount=F5_T78_DEPTH)

    # F5_s79 → F5_t80 (revolve, cut)
    with BuildSketch(Plane(origin=(24.2387067963, -20.129162533, 43), x_dir=(-0.5800964153, 0.8145478187, 0), z_dir=(0.8145478187, 0.5800964153, 0))):
        with BuildLine():
            ThreePointArc((0, -2), (2, 0), (0, 2))
            Line((0, 2), (0, -2))
        make_face()
    revolve(axis=Axis((24.2387067963, -20.129162533, 43), (0, 0, 1)), mode=Mode.SUBTRACT)


with BuildPart() as f1_10:
    add(f1_9.part)

    # F5_t75: cut F5_tool76
    add(f5_tool76.part, mode=Mode.SUBTRACT)


with BuildPart() as f5_tool82:
    # F5_s83 → F5_t84 (new body)
    with BuildSketch(Plane.XY.offset(2)):
        Polygon((-6.2428858846, -31.6924679414), (-5.5335065177, -33.5624360999), (-6.2161423266, -33.8213965297), (-6.90506781, -33.5796656252), align=None)
    extrude(amount=-F5_T84_DEPTH)

    # F5_s85 → F5_t86 (revolve, cut)
    with BuildSketch(Plane(origin=(-6.2428858846, -31.6924679414, 2), x_dir=(-0.0125609888, 0.9999211077, 0), z_dir=(-0.9999211077, -0.0125609888, 0))):
        with BuildLine():
            ThreePointArc((0, -2), (2, 0), (0, 2))
            Line((0, 2), (0, -2))
        make_face()
    revolve(axis=Axis((-6.2428858846, -31.6924679414, 2), (0, 0, -1)), mode=Mode.SUBTRACT)


with BuildPart() as f1_11:
    add(f1_10.part)

    # F5_t81: cut F5_tool82
    add(f5_tool82.part, mode=Mode.SUBTRACT)


with BuildPart() as f5_tool88:
    # F5_s89 → F5_t90 (new body)
    with BuildSketch(Plane.XY.offset(43)):
        Polygon((-6.2428858846, -31.6924679414), (-5.5335065177, -33.5624360999), (-6.2161423266, -33.8213965297), (-6.90506781, -33.5796656252), align=None)
    extrude(amount=F5_T90_DEPTH)

    # F5_s91 → F5_t92 (revolve, cut)
    with BuildSketch(Plane(origin=(-6.2428858846, -31.6924679414, 43), x_dir=(-0.0125609888, 0.9999211077, 0), z_dir=(0.9999211077, 0.0125609888, 0))):
        with BuildLine():
            ThreePointArc((0, -2), (2, 0), (0, 2))
            Line((0, 2), (0, -2))
        make_face()
    revolve(axis=Axis((-6.2428858846, -31.6924679414, 43), (0, 0, 1)), mode=Mode.SUBTRACT)


with BuildPart() as f1_12:
    add(f1_11.part)

    # F5_t87: cut F5_tool88
    add(f5_tool88.part, mode=Mode.SUBTRACT)


with BuildPart() as f5_tool94:
    # F5_s95 → F5_t96 (new body)
    with BuildSketch(Plane.XY.offset(2)):
        Polygon((-12.0627931715, -29.6503726985), (-12.7249750969, -31.5375703823), (-13.3636286482, -31.3134789467), (-13.7349453155, -30.7475997522), align=None)
    extrude(amount=-F5_T96_DEPTH)

    # F5_s97 → F5_t98 (revolve, cut)
    with BuildSketch(Plane(origin=(-12.0627931715, -29.6503726985, 2), x_dir=(0.6160950182, 0.7876718406, 0), z_dir=(-0.7876718406, 0.6160950182, 0))):
        with BuildLine():
            ThreePointArc((0, -2), (2, 0), (0, 2))
            Line((0, 2), (0, -2))
        make_face()
    revolve(axis=Axis((-12.0627931715, -29.6503726985, 2), (0, 0, -1)), mode=Mode.SUBTRACT)


with BuildPart() as f1_13:
    add(f1_12.part)

    # F5_t93: cut F5_tool94
    add(f5_tool94.part, mode=Mode.SUBTRACT)


with BuildPart() as f5_tool100:
    # F5_s101 → F5_t102 (new body)
    with BuildSketch(Plane.XY.offset(43)):
        Polygon((-12.0627931715, -29.6503726985), (-13.7349453155, -30.7475997522), (-13.3636286482, -31.3134789467), (-12.7249750969, -31.5375703823), align=None)
    extrude(amount=F5_T102_DEPTH)

    # F5_s103 → F5_t104 (revolve, cut)
    with BuildSketch(Plane(origin=(-12.0627931715, -29.6503726985, 43), x_dir=(0.6160950182, 0.7876718406, 0), z_dir=(0.7876718406, -0.6160950182, 0))):
        with BuildLine():
            ThreePointArc((0, -2), (2, 0), (0, 2))
            Line((0, 2), (0, -2))
        make_face()
    revolve(axis=Axis((-12.0627931715, -29.6503726985, 43), (0, 0, 1)), mode=Mode.SUBTRACT)


with BuildPart() as f1_14:
    add(f1_13.part)

    # F5_t99: cut F5_tool100
    add(f5_tool100.part, mode=Mode.SUBTRACT)


with BuildPart() as f5_tool106:
    # F5_s107 → F5_t108 (new body)
    with BuildSketch(Plane.XY.offset(2)):
        Polygon((-31.5081597495, -0.0160219017), (-33.1655302123, 1.1034079304), (-33.9107997715, 0), (-33.1803118935, -1.1132489554), align=None)
    extrude(amount=-F5_T108_DEPTH)

    # F5_s109 → F5_t110 (revolve, cut)
    with BuildSketch(Plane(origin=(-31.5081597495, -0.0160219017, 2), x_dir=(0.9999777666, -0.0066683088, 0), z_dir=(0.0066683088, 0.9999777666, 0))):
        with BuildLine():
            ThreePointArc((0, -2), (2, 0), (0, 2))
            Line((0, 2), (0, -2))
        make_face()
    revolve(axis=Axis((-31.5081597495, -0.0160219017, 2), (0, 0, -1)), mode=Mode.SUBTRACT)


with BuildPart() as f1_15:
    add(f1_14.part)

    # F5_t105: cut F5_tool106
    add(f5_tool106.part, mode=Mode.SUBTRACT)


with BuildPart() as f5_tool112:
    # F5_s113 → F5_t114 (new body)
    with BuildSketch(Plane.XY.offset(43)):
        Polygon((-31.5081597495, -0.0160219017), (-33.1803118935, -1.1132489554), (-33.9107997715, 0), (-33.1655302123, 1.1034079304), align=None)
    extrude(amount=F5_T114_DEPTH)

    # F5_s115 → F5_t116 (revolve, cut)
    with BuildSketch(Plane(origin=(-31.5081597495, -0.0160219017, 43), x_dir=(0.9999777666, -0.0066683088, 0), z_dir=(-0.0066683088, -0.9999777666, 0))):
        with BuildLine():
            ThreePointArc((0, -2), (2, 0), (0, 2))
            Line((0, 2), (0, -2))
        make_face()
    revolve(axis=Axis((-31.5081597495, -0.0160219017, 43), (0, 0, 1)), mode=Mode.SUBTRACT)


with BuildPart() as f1_16:
    add(f1_15.part)

    # F5_t111: cut F5_tool112
    add(f5_tool112.part, mode=Mode.SUBTRACT)


with BuildPart() as f5_tool118:
    # F5_s119 → F5_t120 (new body)
    with BuildSketch(Plane.XY.offset(2)):
        Polygon((-14.0692030808, 25.8032039719), (-15.7265735436, 26.922633804), (-15.5701944605, 27.1541606635), (-15.3563537075, 27.3339695529), align=None)
    extrude(amount=-F5_T120_DEPTH)

    # F5_s121 → F5_t122 (revolve, cut)
    with BuildSketch(Plane(origin=(-14.0692030808, 25.8032039719, 2), x_dir=(0.7432782767, -0.6689823641, 0), z_dir=(0.6689823641, 0.7432782767, 0))):
        with BuildLine():
            ThreePointArc((0, -2), (2, 0), (0, 2))
            Line((0, 2), (0, -2))
        make_face()
    revolve(axis=Axis((-14.0692030808, 25.8032039719, 2), (0, 0, -1)), mode=Mode.SUBTRACT)


with BuildPart() as f1_17:
    add(f1_16.part)

    # F5_t117: cut F5_tool118
    add(f5_tool118.part, mode=Mode.SUBTRACT)


with BuildPart() as f5_tool124:
    # F5_s125 → F5_t126 (new body)
    with BuildSketch(Plane.XY.offset(43)):
        Polygon((-14.0692030808, 25.8032039719), (-15.7265735436, 26.922633804), (-15.5701944605, 27.1541606635), (-15.3563537075, 27.3339695529), align=None)
    extrude(amount=F5_T126_DEPTH)

    # F5_s127 → F5_t128 (revolve, cut)
    with BuildSketch(Plane(origin=(-14.0692030808, 25.8032039719, 43), x_dir=(0.7432782767, -0.6689823641, 0), z_dir=(-0.6689823641, -0.7432782767, 0))):
        with BuildLine():
            ThreePointArc((0, -2), (2, 0), (0, 2))
            Line((0, 2), (0, -2))
        make_face()
    revolve(axis=Axis((-14.0692030808, 25.8032039719, 43), (0, 0, 1)), mode=Mode.SUBTRACT)


with BuildPart() as f1_18:
    add(f1_17.part)

    # F5_t123: cut F5_tool124
    add(f5_tool124.part, mode=Mode.SUBTRACT)

    # F6 (on face) → F7 (cut, through all)
    with BuildSketch(Plane.XY.offset(45)):
        Circle(F6_R)
    extrude(amount=-F7_DEPTH, mode=Mode.SUBTRACT)


solid = f1_18.part
